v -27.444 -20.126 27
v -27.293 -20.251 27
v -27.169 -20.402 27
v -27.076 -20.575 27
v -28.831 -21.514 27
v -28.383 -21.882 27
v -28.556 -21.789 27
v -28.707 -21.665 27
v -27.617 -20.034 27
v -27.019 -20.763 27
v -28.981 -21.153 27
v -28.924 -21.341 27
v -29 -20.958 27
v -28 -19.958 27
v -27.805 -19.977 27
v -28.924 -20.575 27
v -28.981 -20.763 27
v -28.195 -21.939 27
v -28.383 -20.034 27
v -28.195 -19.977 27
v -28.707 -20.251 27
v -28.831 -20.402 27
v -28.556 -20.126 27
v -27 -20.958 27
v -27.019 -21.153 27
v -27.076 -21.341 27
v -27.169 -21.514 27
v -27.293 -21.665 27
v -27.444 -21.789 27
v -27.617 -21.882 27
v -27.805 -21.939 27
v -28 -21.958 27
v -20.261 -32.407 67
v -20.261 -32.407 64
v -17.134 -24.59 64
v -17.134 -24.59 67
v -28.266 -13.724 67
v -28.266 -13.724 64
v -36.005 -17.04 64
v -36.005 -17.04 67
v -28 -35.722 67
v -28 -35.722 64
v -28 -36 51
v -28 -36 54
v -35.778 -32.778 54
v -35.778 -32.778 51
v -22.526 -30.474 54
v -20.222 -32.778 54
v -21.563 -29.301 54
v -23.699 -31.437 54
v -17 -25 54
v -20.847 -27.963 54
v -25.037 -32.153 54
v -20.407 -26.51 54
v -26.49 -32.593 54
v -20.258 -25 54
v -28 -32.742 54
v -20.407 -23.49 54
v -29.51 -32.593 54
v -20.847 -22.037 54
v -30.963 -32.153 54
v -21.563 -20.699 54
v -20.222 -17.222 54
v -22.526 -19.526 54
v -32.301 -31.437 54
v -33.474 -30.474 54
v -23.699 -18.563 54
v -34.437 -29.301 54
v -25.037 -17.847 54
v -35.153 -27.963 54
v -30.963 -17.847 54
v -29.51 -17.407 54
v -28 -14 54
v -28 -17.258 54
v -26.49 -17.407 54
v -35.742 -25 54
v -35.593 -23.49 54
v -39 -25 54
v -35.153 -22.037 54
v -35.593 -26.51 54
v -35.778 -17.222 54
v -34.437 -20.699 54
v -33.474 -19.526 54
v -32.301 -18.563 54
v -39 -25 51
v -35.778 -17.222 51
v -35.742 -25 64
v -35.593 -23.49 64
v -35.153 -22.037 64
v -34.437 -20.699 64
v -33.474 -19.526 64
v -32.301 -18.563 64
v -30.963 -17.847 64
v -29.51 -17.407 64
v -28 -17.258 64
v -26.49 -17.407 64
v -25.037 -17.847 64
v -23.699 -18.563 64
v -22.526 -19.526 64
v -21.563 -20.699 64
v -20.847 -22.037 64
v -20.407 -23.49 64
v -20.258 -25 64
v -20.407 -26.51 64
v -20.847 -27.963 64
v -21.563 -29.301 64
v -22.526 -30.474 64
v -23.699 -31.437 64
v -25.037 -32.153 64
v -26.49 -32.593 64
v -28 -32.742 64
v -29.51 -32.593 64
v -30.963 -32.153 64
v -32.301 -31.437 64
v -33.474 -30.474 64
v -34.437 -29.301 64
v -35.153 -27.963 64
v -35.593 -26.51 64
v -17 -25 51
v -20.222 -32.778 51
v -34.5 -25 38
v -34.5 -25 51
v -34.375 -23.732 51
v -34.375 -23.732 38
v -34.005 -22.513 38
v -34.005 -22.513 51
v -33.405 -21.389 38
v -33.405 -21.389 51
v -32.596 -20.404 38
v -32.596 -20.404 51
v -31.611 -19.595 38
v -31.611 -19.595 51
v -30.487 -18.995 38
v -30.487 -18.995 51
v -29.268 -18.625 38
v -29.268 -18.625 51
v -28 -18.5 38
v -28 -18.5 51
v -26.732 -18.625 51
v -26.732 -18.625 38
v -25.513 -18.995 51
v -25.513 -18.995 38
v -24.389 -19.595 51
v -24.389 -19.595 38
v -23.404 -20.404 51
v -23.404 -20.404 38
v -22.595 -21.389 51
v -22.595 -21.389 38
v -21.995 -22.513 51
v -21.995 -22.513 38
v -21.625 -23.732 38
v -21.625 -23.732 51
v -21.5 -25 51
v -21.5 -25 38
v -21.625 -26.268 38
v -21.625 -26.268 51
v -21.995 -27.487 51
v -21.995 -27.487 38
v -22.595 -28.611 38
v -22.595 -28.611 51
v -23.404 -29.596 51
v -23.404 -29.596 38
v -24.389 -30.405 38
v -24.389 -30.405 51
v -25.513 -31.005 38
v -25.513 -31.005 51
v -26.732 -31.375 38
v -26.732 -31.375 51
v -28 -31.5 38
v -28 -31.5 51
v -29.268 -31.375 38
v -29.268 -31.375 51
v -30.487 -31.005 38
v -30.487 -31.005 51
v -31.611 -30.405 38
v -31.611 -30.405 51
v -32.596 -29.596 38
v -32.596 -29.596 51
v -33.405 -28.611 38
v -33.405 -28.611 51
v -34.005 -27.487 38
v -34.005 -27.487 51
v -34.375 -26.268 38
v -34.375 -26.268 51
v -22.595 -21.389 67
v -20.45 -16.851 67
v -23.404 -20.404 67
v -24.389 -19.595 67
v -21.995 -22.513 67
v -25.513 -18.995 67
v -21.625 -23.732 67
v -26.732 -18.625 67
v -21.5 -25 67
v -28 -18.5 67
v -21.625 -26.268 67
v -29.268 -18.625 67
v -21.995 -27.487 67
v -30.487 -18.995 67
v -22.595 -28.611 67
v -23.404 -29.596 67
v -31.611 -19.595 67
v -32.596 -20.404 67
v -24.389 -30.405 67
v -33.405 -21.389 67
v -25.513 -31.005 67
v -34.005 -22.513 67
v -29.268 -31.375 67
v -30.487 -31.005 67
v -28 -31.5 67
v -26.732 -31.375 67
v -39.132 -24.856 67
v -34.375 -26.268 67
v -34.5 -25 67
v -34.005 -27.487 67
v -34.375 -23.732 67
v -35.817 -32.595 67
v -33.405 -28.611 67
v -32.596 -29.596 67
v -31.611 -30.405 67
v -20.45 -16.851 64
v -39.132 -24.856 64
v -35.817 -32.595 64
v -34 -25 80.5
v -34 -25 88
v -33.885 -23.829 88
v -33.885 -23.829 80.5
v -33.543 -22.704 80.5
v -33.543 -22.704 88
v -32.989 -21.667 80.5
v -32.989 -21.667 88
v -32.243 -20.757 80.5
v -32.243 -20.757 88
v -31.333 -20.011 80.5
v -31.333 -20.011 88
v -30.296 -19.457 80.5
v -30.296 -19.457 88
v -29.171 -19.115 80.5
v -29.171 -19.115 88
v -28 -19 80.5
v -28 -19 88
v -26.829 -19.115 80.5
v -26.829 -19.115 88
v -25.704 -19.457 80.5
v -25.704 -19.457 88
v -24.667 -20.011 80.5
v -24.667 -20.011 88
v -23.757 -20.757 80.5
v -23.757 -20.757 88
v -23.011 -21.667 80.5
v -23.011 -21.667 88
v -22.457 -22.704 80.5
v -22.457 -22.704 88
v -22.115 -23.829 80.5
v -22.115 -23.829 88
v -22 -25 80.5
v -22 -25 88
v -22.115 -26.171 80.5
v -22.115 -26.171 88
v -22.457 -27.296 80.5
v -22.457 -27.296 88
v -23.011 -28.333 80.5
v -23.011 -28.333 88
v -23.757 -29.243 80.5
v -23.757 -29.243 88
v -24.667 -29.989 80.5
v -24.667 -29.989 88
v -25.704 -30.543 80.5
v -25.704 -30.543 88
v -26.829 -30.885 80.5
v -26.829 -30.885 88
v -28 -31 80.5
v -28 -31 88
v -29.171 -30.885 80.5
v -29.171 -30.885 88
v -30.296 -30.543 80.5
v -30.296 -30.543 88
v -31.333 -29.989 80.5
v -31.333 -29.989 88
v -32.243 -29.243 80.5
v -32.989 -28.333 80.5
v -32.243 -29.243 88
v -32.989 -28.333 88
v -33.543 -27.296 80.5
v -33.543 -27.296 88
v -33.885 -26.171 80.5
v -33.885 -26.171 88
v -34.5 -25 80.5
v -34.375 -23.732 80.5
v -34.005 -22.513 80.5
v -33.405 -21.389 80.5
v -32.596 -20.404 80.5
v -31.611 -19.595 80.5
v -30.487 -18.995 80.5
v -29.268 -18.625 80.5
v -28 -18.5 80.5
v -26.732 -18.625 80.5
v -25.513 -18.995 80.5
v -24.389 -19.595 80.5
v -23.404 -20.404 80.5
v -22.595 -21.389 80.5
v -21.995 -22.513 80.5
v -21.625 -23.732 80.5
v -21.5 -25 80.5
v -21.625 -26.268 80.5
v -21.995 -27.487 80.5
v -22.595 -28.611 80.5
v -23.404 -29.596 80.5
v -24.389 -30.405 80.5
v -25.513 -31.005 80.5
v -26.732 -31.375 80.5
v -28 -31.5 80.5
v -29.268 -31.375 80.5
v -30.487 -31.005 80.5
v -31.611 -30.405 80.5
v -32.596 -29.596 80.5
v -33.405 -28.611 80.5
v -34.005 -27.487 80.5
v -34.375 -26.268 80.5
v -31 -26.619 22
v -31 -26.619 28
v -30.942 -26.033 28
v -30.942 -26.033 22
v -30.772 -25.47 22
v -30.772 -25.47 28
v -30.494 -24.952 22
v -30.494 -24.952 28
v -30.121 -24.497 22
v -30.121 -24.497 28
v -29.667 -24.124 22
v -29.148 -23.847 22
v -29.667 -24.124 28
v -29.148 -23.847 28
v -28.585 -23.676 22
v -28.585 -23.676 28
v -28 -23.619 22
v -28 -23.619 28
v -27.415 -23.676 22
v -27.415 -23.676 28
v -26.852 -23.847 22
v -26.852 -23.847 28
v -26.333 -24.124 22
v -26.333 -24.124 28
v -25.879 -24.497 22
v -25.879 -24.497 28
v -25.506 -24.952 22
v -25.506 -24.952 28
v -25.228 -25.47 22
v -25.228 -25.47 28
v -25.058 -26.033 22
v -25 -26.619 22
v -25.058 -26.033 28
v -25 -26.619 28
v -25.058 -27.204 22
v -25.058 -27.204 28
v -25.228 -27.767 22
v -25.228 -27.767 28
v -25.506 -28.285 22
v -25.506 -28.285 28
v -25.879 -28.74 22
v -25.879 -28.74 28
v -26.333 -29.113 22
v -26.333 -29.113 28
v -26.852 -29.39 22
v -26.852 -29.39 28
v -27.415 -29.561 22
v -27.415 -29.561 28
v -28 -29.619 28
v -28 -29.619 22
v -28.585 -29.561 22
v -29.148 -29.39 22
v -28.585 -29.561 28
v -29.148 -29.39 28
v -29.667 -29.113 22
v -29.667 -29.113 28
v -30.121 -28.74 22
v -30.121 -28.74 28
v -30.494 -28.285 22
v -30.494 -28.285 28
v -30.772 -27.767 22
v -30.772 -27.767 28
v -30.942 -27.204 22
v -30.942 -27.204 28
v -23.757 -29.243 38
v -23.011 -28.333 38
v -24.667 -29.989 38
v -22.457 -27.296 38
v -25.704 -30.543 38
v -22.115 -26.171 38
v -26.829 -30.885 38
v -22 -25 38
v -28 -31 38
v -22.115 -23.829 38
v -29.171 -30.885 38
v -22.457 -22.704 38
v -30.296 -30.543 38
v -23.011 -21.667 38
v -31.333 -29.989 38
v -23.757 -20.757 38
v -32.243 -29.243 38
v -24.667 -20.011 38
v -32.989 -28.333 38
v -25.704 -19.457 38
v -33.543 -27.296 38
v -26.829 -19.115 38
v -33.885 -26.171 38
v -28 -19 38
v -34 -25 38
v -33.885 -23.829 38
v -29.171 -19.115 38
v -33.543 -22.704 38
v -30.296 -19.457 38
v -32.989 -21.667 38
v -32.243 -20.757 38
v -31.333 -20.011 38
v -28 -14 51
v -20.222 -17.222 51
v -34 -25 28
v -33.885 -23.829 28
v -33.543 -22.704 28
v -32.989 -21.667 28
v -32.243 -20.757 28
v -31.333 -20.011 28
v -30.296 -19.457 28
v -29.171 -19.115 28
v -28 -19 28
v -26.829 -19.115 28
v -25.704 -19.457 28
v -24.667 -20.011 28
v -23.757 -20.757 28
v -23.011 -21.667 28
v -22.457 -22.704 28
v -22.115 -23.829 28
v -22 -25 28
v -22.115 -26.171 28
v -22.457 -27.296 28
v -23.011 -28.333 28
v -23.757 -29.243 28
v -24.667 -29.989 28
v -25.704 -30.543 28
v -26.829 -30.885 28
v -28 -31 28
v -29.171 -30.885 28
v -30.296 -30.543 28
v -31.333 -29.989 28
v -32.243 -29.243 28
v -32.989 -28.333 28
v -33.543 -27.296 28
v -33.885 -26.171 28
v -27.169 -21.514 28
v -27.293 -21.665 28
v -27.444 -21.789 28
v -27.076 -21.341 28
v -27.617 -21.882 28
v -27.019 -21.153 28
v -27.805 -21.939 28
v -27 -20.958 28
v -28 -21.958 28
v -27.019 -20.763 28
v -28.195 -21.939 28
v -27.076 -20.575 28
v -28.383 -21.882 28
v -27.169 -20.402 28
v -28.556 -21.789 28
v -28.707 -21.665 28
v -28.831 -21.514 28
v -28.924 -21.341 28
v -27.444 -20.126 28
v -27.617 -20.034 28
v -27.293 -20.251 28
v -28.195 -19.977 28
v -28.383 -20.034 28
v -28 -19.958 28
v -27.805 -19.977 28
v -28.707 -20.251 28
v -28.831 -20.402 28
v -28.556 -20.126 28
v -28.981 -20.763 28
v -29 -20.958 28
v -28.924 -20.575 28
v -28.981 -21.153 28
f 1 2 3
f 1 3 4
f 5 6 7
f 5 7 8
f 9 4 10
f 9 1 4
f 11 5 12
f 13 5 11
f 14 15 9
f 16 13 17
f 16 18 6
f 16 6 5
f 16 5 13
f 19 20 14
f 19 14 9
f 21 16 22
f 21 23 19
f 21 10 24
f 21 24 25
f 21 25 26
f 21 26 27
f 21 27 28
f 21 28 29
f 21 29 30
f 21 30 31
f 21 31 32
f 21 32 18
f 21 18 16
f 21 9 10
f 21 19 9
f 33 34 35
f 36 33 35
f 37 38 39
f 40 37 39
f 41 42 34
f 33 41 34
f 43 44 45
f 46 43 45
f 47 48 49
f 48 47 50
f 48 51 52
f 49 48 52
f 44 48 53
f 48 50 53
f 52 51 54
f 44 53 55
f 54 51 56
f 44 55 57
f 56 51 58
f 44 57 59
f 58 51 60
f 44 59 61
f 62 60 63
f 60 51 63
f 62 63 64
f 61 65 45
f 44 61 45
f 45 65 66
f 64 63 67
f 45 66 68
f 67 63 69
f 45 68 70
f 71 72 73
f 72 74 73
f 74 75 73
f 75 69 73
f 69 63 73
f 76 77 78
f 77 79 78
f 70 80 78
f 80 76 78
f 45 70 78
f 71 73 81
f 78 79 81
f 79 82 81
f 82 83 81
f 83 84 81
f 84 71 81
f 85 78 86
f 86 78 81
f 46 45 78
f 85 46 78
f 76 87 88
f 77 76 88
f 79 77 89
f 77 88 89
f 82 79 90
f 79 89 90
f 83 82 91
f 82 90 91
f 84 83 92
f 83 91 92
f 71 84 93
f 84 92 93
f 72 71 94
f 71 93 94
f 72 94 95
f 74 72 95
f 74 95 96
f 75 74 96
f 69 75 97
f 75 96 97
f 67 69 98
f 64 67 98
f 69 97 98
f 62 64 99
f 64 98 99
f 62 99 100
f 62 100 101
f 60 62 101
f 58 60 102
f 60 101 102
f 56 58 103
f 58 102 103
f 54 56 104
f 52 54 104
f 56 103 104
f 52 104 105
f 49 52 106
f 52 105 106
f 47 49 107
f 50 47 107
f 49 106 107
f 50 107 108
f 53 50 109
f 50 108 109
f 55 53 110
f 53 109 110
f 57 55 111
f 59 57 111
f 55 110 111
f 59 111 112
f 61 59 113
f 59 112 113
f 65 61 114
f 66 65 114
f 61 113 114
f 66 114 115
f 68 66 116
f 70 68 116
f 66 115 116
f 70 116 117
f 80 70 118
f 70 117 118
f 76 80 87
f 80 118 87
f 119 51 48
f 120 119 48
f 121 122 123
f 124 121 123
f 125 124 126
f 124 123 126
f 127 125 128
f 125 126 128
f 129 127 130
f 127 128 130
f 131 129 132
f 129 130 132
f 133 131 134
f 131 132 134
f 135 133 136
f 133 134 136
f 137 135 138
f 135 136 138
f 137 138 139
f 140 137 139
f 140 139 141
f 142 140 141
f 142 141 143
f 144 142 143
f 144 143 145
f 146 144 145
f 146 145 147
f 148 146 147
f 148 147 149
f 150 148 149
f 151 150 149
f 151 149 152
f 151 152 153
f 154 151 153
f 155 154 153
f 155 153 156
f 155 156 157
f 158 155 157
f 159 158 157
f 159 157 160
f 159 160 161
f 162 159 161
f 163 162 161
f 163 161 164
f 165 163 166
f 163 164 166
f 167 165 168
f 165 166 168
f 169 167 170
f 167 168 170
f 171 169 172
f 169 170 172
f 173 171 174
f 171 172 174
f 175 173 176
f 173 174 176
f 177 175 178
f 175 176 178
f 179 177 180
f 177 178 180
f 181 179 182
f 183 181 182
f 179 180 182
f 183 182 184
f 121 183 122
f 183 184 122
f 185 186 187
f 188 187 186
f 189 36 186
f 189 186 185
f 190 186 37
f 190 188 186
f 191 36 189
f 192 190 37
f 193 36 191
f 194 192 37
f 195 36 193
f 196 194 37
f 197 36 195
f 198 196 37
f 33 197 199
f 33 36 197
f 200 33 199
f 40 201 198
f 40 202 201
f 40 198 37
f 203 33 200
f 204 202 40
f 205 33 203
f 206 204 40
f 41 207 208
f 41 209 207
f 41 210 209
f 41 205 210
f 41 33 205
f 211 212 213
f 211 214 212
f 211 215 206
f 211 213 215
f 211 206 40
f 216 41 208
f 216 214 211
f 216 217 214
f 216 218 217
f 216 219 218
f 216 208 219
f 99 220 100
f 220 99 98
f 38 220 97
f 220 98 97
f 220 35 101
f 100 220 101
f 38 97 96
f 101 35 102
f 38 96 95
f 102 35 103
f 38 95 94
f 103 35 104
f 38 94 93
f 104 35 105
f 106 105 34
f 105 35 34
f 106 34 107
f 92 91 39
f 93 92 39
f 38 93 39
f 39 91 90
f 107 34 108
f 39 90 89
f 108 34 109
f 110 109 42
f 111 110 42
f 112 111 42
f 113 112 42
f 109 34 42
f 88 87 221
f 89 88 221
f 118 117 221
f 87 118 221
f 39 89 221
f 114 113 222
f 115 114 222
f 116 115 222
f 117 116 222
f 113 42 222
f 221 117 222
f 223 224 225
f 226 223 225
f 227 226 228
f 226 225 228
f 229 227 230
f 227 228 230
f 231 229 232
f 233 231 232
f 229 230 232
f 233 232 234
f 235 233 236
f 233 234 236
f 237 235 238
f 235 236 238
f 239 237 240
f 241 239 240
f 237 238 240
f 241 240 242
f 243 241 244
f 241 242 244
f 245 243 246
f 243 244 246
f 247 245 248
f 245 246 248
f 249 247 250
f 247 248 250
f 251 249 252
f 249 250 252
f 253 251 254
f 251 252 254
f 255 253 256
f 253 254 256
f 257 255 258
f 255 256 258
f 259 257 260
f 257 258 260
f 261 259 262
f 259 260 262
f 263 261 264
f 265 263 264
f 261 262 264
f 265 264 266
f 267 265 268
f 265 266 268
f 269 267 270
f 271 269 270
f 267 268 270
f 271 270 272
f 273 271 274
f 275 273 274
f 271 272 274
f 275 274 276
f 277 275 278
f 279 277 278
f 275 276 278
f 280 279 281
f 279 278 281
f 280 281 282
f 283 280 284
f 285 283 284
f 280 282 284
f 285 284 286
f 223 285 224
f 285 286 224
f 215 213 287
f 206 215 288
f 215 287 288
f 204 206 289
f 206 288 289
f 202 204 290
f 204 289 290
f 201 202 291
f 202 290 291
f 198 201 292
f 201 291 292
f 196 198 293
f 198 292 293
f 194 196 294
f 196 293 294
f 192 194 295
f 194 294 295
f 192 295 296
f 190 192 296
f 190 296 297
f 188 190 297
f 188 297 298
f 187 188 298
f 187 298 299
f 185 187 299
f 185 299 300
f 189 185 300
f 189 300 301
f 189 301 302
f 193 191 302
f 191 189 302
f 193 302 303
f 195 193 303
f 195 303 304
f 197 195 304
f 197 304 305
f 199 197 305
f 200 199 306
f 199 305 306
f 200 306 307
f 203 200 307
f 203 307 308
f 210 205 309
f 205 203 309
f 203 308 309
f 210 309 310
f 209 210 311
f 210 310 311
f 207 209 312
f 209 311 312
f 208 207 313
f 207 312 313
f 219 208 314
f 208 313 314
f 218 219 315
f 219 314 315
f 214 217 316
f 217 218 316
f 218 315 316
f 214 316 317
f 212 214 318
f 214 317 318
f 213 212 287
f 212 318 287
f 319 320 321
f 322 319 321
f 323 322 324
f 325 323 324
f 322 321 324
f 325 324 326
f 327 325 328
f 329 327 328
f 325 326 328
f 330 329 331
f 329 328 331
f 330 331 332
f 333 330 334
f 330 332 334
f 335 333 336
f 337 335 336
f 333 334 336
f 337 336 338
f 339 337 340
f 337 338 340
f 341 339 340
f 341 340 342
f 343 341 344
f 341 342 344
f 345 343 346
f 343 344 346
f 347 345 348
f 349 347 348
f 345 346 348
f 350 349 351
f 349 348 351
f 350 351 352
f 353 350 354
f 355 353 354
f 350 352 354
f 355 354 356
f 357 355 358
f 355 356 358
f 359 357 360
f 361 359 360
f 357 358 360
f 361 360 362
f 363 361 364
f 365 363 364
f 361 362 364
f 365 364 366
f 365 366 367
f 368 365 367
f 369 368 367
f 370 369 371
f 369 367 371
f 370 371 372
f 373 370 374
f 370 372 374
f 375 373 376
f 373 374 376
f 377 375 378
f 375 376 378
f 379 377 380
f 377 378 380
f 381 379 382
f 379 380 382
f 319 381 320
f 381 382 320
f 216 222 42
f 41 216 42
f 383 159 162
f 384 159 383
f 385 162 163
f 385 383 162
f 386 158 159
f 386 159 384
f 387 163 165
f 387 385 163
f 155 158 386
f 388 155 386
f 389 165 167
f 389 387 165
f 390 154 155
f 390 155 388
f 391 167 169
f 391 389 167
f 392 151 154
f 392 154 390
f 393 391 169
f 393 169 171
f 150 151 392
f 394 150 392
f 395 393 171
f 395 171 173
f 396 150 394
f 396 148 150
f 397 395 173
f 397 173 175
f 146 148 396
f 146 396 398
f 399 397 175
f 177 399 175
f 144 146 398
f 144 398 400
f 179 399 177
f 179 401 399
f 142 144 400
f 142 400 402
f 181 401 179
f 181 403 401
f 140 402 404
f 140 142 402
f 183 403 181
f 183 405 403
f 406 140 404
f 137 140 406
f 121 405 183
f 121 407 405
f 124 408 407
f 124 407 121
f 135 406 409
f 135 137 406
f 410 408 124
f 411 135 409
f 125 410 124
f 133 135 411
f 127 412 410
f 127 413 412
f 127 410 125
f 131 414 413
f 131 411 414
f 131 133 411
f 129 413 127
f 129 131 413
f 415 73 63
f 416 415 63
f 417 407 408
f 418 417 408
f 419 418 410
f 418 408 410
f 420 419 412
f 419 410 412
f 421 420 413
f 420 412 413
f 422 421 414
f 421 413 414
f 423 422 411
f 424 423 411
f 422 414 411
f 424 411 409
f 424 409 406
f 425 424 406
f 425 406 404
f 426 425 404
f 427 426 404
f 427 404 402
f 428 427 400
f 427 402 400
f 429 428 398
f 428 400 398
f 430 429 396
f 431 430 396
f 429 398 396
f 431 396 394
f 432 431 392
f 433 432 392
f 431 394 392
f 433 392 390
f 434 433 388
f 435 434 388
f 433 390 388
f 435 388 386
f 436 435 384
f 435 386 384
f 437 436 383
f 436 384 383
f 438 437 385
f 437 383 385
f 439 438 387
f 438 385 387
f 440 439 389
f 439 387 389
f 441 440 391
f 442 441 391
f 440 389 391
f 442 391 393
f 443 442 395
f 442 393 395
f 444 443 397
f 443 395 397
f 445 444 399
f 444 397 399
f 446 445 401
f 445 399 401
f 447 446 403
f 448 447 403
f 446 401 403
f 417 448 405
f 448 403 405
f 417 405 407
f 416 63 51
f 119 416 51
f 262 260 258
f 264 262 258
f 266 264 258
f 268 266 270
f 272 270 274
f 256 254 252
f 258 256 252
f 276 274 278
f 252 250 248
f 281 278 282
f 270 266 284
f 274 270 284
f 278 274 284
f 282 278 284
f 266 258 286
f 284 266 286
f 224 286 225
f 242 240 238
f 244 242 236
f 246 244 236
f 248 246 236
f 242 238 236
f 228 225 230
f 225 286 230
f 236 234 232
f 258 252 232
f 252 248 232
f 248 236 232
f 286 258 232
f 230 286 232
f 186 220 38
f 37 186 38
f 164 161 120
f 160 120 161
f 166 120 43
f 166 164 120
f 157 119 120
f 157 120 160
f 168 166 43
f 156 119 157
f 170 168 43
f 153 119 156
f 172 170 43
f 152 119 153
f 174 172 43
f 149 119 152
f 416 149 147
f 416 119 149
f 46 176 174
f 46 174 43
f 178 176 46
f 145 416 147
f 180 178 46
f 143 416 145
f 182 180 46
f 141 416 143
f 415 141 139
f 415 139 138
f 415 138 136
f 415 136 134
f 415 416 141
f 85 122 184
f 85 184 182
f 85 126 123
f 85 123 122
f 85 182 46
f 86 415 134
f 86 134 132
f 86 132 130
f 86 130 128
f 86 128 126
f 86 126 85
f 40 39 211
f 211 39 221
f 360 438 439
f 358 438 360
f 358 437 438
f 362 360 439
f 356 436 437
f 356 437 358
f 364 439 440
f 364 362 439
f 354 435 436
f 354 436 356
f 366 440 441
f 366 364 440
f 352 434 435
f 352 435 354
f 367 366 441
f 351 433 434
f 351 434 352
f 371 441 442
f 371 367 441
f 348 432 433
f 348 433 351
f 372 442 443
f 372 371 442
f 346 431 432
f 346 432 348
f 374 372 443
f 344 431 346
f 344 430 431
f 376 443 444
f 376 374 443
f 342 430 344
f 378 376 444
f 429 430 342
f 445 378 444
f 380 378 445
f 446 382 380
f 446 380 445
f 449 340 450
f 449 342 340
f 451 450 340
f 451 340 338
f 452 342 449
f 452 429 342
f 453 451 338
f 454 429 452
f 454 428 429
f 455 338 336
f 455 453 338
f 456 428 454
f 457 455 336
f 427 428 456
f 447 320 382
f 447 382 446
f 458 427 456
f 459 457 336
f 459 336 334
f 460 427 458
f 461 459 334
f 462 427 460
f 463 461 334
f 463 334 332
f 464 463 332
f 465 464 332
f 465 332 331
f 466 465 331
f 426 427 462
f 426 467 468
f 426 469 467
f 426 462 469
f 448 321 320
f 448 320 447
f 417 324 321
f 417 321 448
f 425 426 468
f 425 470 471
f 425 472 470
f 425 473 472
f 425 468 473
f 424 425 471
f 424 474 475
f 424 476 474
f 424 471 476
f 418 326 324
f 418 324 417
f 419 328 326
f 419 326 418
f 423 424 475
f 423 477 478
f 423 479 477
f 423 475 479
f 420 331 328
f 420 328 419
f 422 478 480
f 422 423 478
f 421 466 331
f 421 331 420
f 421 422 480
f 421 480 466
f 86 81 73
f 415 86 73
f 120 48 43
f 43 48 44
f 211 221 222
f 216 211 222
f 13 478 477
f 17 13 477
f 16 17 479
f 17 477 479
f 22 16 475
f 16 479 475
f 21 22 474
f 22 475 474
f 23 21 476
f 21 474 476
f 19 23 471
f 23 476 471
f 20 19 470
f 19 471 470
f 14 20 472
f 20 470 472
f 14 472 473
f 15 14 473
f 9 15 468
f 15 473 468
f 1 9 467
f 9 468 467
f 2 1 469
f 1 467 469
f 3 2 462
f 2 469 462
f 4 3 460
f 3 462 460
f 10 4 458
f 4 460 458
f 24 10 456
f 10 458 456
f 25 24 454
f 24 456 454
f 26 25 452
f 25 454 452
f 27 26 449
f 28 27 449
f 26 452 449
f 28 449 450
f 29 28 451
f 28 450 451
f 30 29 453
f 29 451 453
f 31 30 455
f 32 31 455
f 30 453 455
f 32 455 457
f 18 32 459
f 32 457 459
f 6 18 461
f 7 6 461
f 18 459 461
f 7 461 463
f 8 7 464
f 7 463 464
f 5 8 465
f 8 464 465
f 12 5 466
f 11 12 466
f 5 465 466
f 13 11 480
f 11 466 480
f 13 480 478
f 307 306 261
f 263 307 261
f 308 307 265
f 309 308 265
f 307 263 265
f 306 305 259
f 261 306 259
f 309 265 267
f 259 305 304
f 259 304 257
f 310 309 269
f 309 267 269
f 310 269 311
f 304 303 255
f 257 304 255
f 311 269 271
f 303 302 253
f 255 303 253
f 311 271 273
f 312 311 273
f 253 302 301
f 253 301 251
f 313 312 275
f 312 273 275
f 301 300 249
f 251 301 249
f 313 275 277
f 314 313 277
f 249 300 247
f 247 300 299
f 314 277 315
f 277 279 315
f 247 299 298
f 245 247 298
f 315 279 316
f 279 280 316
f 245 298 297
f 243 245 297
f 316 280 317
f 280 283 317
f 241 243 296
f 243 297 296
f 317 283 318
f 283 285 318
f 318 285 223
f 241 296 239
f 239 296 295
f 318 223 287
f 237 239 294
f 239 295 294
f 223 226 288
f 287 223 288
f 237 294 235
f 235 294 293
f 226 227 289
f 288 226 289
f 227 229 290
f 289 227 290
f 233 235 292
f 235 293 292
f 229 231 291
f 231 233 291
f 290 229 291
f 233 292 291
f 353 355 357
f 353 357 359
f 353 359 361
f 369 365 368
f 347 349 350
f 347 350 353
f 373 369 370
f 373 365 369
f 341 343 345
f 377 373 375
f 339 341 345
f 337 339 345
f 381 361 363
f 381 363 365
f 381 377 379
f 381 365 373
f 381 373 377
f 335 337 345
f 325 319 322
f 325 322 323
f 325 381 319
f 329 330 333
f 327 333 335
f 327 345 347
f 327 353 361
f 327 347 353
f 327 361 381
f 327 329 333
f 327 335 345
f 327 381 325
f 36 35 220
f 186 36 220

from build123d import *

# Parameters (mm, degrees)
SKETCH014_R             = 6
PAD012_DEPTH            = 7.5
SKETCH015_R             = 6.5
PAD013_DEPTH            = 42.5
SKETCH016_R             = 6
PAD014_DEPTH            = 10
SKETCH017_R             = 3
PAD015_DEPTH            = 6
SKETCH018_R             = 1
PAD016_DEPTH            = 1
PAD017_DEPTH            = 3
SKETCH020_R             = 7.741832
PAD018_DEPTH            = 10
PAD019_DEPTH            = 3
BODY003_PLACEMENT_ANGLE = 180


with BuildPart() as part:
    # Sketch014 → Pad012 (new body)
    with BuildSketch(Plane.XY):
        Circle(SKETCH014_R)
    extrude(amount=PAD012_DEPTH)

    # Sketch015 (on Face3 of Pad012) → Pad013 (join)
    with BuildSketch(Plane.XY.offset(7.5)):
        Circle(SKETCH015_R)
    extrude(amount=PAD013_DEPTH)

    # Sketch016 (on Face5 of Pad013) → Pad014 (join)
    with BuildSketch(Plane.XY.offset(50)):
        Circle(SKETCH016_R)
    extrude(amount=PAD014_DEPTH)

    # Sketch017 (on Face7 of Pad014) → Pad015 (join)
    with BuildSketch(Plane.XY.offset(60)):
        with Locations((0, -1.61854)):
            Circle(SKETCH017_R)
    extrude(amount=PAD015_DEPTH)

    # Sketch018 (on Face7 of Pad015) → Pad016 (join)
    with BuildSketch(Plane.XY.offset(60)):
        with Locations((0, 4.042031)):
            Circle(SKETCH018_R)
    extrude(amount=PAD016_DEPTH)

    # Sketch019 (on Face2 of Pad016) → Pad017 (join)
    with BuildSketch(Plane(origin=(0, 0, 24), x_dir=(1, 0, 0), z_dir=(0, 0, -1))):
        Polygon((0, 10.722278), (-7.738631, 7.406596), (-10.866129, -0.409983), (-7.550447, -8.148615), (0.266132, -11.276112), (8.004764, -7.960431), (11.132261, -0.143851), (7.81658, 7.59478), align=None)
    extrude(amount=PAD017_DEPTH)

    # Sketch020 (on Face14 of Pad017) → Pad018 (join)
    with BuildSketch(Plane.XY.offset(24)):
        Circle(SKETCH020_R)
    extrude(amount=PAD018_DEPTH)

    # Sketch021 (on Face16 of Pad018) → Pad019 (join)
    with BuildSketch(Plane.XY.offset(34)):
        Polygon((0, 11), (-7.778175, 7.778175), (-11, 0), (-7.778175, -7.778175), (0, -11), (7.778175, -7.778175), (11, 0), (7.778175, 7.778175), align=None)
    extrude(amount=PAD019_DEPTH)


with BuildPart() as part_1:
    # Body003 placement: moved
    add(part.part.moved(Location((-28, -25, 88))).rotate(Axis((-28, -25, 88), (0, 1, 0)), BODY003_PLACEMENT_ANGLE))


solid = part_1.part
